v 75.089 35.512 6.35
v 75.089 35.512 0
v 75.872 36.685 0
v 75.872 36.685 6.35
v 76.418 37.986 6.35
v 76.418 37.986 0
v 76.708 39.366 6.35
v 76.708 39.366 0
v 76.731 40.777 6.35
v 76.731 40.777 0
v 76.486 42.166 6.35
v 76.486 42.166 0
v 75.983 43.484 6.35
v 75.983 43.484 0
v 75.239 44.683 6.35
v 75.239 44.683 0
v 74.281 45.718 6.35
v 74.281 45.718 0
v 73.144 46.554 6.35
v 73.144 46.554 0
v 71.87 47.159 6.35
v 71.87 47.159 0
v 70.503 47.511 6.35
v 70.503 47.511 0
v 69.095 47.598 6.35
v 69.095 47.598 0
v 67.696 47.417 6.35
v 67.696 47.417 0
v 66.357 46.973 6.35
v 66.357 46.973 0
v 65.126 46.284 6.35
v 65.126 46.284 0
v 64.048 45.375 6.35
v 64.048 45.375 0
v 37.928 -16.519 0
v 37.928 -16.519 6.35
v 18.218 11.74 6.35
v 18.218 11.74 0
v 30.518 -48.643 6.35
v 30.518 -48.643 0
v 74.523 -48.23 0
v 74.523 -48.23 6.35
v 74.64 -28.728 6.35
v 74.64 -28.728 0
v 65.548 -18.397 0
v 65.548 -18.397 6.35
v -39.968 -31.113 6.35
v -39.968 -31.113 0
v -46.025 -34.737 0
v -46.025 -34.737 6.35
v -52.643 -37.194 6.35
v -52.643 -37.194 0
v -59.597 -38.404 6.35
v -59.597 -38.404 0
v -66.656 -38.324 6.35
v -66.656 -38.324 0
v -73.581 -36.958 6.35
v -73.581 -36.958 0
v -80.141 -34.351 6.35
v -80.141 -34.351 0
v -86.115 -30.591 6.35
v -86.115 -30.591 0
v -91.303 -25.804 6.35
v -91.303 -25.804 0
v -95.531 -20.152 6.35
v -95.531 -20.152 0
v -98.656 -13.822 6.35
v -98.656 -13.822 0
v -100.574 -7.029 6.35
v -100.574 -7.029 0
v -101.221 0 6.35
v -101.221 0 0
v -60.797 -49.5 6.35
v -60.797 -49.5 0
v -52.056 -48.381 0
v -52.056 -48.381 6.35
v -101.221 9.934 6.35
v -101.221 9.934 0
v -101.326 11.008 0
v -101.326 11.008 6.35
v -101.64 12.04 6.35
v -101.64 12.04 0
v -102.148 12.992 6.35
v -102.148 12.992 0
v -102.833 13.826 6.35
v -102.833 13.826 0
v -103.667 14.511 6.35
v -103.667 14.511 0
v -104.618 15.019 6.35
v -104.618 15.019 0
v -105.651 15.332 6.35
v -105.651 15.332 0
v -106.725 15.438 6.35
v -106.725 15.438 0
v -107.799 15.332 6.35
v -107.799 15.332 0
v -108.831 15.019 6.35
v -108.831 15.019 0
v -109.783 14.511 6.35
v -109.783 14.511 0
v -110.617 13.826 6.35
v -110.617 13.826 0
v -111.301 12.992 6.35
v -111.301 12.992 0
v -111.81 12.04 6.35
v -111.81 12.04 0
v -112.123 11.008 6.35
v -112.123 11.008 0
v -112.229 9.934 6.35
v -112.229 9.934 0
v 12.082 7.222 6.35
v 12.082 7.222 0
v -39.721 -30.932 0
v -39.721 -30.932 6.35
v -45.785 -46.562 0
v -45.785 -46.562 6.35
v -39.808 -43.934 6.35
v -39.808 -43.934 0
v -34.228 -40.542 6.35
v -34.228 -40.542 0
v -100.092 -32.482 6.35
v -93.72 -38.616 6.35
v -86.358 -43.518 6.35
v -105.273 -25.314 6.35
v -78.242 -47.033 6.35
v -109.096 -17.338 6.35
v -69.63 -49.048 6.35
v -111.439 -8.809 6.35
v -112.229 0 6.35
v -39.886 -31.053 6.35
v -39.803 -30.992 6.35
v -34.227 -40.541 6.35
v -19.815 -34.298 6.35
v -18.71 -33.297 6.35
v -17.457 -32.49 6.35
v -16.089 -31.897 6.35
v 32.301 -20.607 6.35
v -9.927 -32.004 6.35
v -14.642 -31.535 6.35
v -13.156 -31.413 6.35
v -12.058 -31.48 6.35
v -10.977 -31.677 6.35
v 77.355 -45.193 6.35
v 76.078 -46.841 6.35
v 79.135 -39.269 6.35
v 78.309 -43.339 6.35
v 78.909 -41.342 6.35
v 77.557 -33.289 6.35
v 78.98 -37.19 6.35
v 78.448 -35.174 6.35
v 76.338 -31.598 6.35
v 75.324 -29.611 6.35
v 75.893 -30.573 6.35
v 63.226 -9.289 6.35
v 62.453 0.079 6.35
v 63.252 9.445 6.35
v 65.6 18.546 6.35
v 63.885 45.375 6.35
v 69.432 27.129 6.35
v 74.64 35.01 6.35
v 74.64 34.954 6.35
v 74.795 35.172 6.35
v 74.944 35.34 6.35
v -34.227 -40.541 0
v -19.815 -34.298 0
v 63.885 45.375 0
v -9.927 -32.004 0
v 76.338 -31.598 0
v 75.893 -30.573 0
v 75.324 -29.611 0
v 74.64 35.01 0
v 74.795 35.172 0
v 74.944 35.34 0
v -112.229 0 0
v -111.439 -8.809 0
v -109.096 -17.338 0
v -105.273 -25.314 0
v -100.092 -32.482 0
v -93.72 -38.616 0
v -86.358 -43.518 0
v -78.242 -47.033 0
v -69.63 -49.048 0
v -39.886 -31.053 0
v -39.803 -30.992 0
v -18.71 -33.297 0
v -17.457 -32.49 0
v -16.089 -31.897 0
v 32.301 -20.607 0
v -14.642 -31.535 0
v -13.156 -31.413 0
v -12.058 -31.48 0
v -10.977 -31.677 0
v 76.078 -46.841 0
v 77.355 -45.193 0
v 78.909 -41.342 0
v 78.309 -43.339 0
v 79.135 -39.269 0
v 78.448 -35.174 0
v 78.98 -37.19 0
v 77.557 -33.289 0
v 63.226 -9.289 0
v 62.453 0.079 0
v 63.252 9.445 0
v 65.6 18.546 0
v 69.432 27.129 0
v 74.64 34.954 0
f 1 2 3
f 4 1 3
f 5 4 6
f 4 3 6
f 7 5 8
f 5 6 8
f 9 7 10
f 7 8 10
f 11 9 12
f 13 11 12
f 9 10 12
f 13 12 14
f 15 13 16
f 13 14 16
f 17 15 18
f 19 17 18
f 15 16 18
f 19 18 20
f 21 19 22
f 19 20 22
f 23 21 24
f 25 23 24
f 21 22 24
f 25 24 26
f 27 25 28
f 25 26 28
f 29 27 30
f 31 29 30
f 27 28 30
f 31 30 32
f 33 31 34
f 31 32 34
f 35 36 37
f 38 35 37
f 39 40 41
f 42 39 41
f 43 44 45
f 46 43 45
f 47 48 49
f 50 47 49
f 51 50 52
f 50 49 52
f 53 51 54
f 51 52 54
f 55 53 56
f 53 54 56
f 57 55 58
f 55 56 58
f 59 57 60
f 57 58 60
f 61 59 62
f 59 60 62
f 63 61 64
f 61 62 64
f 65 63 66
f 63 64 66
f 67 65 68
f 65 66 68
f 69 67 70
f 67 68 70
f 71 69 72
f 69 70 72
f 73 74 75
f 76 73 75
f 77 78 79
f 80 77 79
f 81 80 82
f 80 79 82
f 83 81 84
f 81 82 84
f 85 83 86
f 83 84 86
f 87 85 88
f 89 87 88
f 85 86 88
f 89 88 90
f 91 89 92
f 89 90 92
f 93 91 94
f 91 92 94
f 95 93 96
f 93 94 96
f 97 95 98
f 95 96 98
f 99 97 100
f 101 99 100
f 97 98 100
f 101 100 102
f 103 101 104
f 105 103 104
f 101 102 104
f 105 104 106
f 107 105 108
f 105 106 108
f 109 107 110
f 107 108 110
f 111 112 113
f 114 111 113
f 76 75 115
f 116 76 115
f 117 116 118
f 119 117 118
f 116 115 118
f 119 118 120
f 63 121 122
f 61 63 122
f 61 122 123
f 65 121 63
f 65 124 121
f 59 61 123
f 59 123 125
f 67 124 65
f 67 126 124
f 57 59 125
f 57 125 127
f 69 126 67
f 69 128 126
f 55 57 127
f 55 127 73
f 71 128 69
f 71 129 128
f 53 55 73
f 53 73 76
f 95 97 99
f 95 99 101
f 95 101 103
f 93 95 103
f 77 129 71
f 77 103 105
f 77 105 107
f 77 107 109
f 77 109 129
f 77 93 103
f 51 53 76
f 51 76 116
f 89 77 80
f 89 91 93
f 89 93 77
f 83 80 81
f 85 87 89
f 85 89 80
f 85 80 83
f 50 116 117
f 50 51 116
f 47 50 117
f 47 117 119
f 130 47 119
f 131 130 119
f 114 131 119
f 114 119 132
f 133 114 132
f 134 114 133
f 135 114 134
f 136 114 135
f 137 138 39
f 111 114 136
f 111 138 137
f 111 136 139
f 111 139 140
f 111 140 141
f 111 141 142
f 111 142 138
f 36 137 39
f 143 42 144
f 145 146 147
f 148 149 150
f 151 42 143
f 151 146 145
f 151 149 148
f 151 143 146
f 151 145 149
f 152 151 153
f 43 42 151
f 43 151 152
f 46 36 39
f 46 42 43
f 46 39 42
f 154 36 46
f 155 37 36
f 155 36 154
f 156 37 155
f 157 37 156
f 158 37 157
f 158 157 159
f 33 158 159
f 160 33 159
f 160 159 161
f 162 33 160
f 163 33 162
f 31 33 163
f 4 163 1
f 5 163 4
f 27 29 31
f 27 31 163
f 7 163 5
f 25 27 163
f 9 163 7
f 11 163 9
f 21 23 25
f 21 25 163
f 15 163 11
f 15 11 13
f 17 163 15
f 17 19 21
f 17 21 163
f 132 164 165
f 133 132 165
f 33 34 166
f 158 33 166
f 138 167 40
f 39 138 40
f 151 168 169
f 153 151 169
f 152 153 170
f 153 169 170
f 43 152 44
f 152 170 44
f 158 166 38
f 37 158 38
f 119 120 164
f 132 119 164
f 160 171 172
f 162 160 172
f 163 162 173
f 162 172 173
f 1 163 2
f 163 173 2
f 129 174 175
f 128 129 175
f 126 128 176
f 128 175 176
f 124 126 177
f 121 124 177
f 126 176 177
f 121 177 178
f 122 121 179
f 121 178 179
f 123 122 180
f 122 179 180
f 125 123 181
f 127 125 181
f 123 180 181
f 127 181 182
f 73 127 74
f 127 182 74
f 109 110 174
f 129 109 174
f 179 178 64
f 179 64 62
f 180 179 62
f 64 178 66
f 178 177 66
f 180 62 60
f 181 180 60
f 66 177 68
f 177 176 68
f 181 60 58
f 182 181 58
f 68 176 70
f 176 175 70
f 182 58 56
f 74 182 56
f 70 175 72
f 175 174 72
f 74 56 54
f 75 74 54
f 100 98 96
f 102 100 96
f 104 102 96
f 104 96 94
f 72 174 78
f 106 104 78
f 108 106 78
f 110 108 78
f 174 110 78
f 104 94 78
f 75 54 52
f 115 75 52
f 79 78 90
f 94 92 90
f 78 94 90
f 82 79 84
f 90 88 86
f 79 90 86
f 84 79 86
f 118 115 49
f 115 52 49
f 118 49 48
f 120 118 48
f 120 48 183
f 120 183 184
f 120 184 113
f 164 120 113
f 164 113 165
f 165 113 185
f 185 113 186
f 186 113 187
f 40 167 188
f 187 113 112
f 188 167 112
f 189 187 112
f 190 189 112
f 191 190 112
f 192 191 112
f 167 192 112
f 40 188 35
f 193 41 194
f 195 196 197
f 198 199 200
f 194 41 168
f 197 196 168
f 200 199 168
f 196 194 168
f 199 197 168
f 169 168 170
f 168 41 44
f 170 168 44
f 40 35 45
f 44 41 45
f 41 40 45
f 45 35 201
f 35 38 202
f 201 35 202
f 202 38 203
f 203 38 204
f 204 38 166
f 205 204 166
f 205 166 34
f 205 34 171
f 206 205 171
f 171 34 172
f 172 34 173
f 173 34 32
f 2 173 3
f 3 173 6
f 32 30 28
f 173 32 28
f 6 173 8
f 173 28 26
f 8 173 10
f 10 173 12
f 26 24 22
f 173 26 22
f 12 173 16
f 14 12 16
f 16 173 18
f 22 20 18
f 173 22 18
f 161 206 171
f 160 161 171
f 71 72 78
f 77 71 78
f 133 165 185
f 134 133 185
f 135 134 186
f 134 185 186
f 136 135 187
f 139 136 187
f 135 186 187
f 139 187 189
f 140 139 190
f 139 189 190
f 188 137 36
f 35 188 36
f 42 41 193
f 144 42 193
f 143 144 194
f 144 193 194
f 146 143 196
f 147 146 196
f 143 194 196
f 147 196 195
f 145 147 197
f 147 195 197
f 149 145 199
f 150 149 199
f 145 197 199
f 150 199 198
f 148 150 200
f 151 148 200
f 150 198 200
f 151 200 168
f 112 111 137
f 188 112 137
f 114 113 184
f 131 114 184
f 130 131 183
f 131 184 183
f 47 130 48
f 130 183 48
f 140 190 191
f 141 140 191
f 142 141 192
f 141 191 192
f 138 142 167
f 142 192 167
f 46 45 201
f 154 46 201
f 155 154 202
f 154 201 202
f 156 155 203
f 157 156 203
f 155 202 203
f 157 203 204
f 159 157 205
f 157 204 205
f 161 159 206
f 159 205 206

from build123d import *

# Parameters (mm, degrees)
F1_DEPTH = 6.35
F3_DEPTH = 6.351


with BuildPart() as f1:
    # F0 (on Top) → F1 (new body)
    with BuildSketch(Plane.XY):
        with BuildLine():
            Line((64.0479785321, 45.3746123328), (63.8854764337, 45.3746123328))
            Line((63.8854764337, 45.3746123328), (2.2767815665, 0))
            Line((2.2767815665, 0), (-39.7214530308, -30.9315692797))
            ThreePointArc((-39.7214530308, -30.9315692797), (-39.8444384128, -31.0225247493), (-39.9677839364, -31.1129912262))
            ThreePointArc((-39.9677839364, -31.1129912262), (-80.1407322996, -34.3509043357), (-101.2207046151, 0))
            Line((-101.2207046151, 0), (-101.2207046151, 9.9341273308))
            ThreePointArc((-101.2207046151, 9.9341273308), (-106.7247502506, 15.4381729662), (-112.228795886, 9.9341273308))
            Line((-112.228795886, 9.9341273308), (-112.228795886, 0))
            ThreePointArc((-112.228795886, 0), (-97.0433078129, -35.6915315199), (-60.7969101261, -49.5003375864))
            Line((-60.7969101261, -49.5003375864), (-52.0564235031, -48.3813164917))
            ThreePointArc((-52.0564235031, -48.3813164917), (-42.7531679645, -45.3464600069), (-34.228034924, -40.5419804156))
            Line((-34.228034924, -40.5419804156), (-34.2284778363, -40.5419804156))
            Line((-34.2284778363, -40.5419804156), (-34.2273214057, -40.5414794451))
            Line((-34.2273214057, -40.5414794451), (-19.8154687348, -34.2982047457))
            ThreePointArc((-19.8154687348, -34.2982047457), (-16.7847778238, -32.1655358704), (-13.1560671025, -31.4133241773))
            ThreePointArc((-13.1560671025, -31.4133241773), (-11.5145721435, -31.5621218969), (-9.9265901442, -32.0036642296))
            Line((-9.9265901442, -32.0036642296), (30.5177745747, -48.6430156736))
            Line((30.5177745747, -48.6430156736), (74.522745552, -48.229868259))
            ThreePointArc((74.522745552, -48.229868259), (79.0697257066, -40.3110135201), (76.337517689, -31.5979010883))
            ThreePointArc((76.337517689, -31.5979010883), (75.6238074008, -30.083288758), (74.6402267249, -28.7282972671))
            Line((74.6402267249, -28.7282972671), (65.5481898023, -18.39660376))
            ThreePointArc((65.5481898023, -18.39660376), (63.2520758801, 9.4447724115), (74.6402267249, 34.9540724138))
            Line((74.6402267249, 34.9540724138), (74.6402267249, 35.0096798031))
            ThreePointArc((74.6402267249, 35.0096798031), (74.8701460848, 35.255569914), (75.088660103, 35.5116489692))
            ThreePointArc((75.088660103, 35.5116489692), (74.2807317817, 45.7182435688), (64.0479785321, 45.3746123328))
        make_face()
    extrude(amount=F1_DEPTH)

    # F2 (on face) → F3 (cut, through all)
    with BuildSketch(Plane.XY.offset(6.35)):
        Polygon((12.0820117015, 7.2215215266), (32.3011358824, -20.6074602199), (37.9280887206, -16.5192021861), (18.2175485278, 11.7403253342), align=None)
    extrude(amount=-F3_DEPTH, mode=Mode.SUBTRACT)


solid = f1.part
